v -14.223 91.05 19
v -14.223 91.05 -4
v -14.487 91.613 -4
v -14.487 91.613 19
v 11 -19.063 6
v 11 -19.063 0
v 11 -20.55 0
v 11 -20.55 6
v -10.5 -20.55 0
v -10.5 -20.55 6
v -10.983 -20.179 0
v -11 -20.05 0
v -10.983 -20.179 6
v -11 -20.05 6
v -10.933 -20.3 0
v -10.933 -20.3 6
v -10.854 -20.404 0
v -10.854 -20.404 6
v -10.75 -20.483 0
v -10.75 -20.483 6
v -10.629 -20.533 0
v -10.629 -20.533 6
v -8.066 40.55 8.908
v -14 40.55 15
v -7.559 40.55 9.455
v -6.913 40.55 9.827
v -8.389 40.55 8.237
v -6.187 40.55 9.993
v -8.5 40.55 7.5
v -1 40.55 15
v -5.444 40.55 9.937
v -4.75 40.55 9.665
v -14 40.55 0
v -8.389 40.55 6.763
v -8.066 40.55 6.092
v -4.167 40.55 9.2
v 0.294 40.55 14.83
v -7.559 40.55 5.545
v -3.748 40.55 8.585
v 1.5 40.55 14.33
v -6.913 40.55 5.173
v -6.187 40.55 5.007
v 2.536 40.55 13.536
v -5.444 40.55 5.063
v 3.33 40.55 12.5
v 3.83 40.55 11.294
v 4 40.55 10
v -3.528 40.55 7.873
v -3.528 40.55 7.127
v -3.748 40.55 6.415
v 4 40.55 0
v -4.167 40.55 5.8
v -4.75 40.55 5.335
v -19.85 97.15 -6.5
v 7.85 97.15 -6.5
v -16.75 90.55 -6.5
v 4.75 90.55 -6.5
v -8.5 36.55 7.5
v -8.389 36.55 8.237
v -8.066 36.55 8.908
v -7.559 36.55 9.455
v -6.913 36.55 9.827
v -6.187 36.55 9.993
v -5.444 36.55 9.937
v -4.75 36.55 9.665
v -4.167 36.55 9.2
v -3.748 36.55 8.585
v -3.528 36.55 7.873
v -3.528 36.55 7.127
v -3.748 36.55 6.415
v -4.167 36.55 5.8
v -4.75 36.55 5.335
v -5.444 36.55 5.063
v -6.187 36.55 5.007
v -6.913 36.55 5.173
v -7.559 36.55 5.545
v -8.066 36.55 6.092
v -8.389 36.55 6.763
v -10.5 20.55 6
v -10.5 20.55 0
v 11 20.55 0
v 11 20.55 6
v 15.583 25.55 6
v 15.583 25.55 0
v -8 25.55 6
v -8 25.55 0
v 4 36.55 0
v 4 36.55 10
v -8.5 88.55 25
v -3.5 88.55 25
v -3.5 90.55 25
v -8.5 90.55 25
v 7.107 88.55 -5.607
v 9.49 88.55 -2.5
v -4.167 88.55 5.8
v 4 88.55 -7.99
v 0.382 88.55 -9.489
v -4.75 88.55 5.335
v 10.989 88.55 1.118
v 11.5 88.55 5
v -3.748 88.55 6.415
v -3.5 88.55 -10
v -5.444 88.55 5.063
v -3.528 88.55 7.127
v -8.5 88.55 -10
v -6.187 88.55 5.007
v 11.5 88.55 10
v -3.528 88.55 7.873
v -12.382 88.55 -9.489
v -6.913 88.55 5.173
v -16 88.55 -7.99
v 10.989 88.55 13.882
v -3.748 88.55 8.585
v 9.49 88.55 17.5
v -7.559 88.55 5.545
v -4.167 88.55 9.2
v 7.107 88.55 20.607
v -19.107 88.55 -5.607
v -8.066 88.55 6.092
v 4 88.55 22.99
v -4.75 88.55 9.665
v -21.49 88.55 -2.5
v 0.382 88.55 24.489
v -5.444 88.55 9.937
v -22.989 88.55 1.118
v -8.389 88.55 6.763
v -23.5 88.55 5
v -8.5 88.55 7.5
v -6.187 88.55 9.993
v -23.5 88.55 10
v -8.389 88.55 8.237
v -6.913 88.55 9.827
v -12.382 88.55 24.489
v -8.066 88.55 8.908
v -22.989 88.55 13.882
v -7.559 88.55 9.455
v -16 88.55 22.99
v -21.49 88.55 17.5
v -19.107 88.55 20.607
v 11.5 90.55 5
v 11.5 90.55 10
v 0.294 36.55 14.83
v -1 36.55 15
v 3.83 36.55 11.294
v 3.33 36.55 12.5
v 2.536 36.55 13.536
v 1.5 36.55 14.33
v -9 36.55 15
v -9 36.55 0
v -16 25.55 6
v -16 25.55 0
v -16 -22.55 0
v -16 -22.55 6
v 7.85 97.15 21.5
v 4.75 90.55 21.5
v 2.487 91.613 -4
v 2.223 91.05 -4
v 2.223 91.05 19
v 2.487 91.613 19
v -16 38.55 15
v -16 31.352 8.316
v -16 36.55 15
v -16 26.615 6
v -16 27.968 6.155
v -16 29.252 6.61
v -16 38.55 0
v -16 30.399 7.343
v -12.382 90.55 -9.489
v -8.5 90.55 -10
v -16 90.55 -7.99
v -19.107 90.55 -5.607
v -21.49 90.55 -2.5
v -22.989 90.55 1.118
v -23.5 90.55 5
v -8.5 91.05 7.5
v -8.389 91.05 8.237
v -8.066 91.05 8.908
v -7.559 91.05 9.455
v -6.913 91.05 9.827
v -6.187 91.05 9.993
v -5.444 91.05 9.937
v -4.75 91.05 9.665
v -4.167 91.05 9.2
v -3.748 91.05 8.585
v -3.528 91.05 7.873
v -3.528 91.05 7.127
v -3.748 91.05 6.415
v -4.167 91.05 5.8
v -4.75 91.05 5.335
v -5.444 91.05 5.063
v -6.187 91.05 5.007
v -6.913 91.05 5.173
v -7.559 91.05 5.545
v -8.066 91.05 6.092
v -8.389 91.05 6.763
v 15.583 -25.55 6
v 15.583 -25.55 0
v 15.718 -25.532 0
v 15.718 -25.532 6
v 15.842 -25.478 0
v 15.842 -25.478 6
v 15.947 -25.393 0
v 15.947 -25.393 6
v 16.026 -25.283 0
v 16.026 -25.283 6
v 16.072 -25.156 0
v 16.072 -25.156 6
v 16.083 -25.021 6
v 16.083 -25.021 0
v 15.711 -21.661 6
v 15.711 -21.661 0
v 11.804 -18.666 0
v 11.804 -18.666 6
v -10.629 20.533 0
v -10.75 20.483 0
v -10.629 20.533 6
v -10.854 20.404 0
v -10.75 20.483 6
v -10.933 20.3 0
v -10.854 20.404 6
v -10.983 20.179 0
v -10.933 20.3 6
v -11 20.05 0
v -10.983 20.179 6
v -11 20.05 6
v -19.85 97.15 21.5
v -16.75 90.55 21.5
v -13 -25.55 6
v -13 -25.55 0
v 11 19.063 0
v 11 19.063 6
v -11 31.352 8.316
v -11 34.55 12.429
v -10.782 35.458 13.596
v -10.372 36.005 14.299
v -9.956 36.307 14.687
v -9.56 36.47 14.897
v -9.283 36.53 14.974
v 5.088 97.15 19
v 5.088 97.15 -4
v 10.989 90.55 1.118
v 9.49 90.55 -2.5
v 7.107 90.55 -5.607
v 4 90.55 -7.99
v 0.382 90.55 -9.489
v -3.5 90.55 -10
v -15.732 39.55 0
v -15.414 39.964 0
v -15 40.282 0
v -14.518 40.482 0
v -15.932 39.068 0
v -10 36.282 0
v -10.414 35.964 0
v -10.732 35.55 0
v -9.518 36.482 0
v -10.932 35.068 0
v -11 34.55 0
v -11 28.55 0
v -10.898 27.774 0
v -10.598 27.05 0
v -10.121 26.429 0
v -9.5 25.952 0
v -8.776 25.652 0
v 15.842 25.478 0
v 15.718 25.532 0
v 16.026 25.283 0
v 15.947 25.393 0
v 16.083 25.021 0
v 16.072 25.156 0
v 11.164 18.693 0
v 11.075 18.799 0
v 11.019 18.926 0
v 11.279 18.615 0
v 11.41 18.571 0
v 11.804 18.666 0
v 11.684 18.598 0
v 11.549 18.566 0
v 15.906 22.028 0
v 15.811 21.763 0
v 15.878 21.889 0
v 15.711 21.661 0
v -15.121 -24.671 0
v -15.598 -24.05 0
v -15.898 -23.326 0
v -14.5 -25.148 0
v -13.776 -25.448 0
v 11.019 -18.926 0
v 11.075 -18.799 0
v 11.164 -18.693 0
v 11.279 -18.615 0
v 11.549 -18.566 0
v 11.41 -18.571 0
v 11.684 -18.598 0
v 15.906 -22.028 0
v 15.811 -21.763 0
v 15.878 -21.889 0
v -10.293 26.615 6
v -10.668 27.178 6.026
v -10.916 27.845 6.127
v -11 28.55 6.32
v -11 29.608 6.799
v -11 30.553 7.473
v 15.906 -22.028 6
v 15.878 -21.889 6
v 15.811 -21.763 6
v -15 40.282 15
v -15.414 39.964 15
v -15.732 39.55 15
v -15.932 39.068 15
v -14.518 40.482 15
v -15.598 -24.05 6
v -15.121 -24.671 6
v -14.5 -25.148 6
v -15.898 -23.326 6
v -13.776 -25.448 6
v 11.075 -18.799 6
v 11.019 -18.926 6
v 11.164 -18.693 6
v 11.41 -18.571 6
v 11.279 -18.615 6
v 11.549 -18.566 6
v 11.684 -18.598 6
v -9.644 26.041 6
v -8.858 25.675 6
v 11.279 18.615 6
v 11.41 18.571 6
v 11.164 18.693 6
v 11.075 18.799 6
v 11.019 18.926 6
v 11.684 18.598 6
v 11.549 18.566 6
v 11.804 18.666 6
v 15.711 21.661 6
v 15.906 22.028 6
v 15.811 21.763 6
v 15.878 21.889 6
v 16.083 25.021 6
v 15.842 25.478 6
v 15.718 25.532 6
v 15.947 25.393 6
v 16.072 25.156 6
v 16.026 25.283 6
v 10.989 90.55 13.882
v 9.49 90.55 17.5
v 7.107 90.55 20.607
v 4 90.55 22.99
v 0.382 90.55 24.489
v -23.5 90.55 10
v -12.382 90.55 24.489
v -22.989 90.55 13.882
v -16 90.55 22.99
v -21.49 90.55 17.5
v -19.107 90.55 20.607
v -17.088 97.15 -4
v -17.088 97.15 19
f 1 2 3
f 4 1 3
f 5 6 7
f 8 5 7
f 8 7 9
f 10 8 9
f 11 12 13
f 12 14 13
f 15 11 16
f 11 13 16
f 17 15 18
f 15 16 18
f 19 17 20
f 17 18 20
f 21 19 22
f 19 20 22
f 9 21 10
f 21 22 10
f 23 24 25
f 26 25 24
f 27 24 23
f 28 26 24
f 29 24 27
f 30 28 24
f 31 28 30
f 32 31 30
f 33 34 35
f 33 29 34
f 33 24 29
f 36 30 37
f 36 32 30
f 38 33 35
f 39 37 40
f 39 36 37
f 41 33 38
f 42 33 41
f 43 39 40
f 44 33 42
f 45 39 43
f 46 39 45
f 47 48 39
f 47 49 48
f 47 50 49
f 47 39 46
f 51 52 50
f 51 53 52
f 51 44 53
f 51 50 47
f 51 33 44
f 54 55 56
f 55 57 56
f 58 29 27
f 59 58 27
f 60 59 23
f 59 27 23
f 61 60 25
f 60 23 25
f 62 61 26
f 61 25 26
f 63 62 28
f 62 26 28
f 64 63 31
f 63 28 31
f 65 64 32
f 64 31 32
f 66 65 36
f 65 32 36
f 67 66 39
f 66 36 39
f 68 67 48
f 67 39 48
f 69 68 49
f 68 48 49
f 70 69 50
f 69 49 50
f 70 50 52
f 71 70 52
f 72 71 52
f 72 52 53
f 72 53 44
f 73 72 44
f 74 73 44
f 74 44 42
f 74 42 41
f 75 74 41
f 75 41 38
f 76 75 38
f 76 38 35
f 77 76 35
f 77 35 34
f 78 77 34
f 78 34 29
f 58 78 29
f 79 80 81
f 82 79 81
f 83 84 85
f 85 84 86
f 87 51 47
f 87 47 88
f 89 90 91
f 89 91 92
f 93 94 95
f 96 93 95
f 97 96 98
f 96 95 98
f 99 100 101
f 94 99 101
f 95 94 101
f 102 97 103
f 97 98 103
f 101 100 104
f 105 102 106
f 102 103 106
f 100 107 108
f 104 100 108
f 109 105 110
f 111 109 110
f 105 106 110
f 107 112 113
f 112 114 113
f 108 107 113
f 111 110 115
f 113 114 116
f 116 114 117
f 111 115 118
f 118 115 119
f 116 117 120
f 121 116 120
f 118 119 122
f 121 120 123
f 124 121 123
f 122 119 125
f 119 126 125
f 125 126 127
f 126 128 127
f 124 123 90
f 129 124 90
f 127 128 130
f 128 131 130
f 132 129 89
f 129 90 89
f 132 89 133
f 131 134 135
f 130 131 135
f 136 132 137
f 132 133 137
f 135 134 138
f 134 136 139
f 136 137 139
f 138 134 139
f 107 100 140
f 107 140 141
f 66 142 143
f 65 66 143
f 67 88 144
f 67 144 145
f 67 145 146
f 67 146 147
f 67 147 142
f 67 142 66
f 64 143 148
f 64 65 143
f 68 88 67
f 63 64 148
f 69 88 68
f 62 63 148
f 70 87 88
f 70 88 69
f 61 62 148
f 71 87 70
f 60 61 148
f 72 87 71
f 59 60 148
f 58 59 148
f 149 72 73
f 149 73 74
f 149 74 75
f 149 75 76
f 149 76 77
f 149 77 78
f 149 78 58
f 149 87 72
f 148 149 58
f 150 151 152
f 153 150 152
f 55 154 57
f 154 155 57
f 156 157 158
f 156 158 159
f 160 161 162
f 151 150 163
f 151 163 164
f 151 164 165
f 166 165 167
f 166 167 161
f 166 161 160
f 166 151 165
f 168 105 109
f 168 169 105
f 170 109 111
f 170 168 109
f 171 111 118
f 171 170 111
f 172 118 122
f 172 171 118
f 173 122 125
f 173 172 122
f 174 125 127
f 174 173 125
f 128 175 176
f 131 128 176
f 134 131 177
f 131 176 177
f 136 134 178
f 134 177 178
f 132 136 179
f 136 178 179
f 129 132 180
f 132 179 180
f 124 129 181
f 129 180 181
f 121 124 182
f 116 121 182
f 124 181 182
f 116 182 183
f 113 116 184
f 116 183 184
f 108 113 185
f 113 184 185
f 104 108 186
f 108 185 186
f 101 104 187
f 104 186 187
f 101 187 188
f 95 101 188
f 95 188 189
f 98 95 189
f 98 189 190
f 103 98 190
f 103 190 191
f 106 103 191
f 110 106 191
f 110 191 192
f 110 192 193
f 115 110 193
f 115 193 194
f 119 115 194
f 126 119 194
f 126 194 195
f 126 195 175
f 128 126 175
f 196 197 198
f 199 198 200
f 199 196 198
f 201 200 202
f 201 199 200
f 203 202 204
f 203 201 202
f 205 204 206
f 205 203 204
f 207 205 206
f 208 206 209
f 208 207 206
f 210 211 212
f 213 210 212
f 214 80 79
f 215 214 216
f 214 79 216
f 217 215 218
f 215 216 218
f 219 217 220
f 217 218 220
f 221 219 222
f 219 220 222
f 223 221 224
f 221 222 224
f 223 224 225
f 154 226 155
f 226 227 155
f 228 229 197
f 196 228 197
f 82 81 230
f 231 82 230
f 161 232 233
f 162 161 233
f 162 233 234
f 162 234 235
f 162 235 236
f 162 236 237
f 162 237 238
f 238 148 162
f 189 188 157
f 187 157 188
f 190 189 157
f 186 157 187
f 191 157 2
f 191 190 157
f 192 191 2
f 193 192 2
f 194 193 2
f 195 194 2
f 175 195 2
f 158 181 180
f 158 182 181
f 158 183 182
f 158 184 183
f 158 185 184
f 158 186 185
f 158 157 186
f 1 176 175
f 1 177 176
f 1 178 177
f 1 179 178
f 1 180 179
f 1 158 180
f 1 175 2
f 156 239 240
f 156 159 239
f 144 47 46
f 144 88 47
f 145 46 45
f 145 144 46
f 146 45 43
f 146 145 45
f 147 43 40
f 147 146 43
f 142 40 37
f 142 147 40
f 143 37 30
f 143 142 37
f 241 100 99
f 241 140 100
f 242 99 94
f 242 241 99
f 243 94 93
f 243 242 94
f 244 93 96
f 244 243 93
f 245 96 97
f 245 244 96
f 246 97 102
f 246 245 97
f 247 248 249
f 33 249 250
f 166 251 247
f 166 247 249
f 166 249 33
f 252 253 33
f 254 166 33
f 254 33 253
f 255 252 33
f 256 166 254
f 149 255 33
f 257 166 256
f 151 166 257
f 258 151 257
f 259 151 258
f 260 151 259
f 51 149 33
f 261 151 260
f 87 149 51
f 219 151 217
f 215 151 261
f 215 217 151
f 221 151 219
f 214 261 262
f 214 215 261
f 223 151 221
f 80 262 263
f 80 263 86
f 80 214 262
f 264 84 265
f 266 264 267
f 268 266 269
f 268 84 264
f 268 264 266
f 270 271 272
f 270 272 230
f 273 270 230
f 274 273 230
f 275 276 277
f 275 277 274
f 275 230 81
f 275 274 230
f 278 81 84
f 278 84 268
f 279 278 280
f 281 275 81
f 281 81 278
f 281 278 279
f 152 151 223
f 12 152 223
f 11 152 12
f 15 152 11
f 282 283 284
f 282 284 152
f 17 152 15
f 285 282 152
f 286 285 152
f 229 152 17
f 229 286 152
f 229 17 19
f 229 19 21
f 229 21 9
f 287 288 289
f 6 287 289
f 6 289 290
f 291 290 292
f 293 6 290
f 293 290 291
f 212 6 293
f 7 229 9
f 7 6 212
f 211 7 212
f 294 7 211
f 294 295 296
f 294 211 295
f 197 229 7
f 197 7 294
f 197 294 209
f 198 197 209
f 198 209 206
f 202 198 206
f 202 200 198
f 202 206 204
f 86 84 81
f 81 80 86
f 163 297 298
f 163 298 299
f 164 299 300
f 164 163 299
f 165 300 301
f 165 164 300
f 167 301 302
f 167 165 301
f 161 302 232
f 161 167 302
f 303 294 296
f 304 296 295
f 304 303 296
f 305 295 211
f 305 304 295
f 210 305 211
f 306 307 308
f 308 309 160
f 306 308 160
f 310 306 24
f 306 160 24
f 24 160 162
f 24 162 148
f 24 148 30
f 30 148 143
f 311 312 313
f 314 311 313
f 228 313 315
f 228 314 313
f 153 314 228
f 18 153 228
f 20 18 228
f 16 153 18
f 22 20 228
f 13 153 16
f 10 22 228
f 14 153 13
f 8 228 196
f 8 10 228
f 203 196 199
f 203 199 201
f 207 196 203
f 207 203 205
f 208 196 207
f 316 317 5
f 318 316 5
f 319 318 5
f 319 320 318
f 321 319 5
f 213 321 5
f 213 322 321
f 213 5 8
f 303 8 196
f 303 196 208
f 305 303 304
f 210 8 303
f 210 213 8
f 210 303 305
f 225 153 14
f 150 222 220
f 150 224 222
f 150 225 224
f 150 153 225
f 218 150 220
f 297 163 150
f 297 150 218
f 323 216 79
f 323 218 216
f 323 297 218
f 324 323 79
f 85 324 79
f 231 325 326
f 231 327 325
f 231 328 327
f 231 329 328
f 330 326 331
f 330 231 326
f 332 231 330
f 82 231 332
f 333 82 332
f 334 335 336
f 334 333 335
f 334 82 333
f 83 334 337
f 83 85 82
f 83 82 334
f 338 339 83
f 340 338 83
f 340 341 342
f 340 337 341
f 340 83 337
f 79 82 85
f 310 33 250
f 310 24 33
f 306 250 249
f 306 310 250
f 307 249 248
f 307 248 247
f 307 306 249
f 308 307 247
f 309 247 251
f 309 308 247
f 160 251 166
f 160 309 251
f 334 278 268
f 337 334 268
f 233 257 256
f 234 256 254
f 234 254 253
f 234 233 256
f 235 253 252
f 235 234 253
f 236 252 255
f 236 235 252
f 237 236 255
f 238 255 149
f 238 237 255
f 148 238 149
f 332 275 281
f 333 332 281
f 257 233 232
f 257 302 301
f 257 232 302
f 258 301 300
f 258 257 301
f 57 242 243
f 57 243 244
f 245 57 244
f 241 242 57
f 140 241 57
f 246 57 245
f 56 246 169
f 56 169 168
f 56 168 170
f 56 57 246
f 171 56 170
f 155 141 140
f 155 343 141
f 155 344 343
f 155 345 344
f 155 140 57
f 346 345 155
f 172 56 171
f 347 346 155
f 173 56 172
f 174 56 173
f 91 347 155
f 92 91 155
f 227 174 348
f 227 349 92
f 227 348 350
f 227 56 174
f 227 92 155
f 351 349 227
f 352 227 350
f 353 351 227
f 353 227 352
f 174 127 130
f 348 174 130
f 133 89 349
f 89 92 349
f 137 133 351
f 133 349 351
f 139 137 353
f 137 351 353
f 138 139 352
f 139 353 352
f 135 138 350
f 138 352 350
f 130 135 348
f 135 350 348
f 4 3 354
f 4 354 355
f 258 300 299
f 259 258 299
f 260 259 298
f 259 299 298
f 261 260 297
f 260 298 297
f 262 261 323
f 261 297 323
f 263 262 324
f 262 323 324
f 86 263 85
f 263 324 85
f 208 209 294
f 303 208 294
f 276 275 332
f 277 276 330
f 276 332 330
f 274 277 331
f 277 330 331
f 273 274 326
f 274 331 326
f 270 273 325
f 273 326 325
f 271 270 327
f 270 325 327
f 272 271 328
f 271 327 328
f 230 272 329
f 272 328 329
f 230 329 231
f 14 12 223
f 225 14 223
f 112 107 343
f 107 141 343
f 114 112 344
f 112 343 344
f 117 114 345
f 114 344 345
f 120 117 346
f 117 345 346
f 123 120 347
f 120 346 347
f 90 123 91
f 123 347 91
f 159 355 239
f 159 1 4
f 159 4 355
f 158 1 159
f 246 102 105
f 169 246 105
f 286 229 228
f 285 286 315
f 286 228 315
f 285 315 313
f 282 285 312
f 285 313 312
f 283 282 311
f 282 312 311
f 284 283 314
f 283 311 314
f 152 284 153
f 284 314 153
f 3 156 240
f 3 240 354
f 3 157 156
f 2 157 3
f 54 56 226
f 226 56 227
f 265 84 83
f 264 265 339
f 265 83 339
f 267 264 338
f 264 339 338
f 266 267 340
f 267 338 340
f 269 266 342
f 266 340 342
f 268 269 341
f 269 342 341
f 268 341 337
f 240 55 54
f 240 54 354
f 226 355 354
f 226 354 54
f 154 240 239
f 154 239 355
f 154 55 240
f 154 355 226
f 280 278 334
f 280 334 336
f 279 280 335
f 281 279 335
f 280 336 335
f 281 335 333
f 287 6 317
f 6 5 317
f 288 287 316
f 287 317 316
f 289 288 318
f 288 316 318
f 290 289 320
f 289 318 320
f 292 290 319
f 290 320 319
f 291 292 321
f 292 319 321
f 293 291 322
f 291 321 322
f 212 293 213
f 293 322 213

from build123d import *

# Parameters (mm, degrees)
F1_DEPTH     = 6
F3_DEPTH     = 15
F5_DEPTH     = 5.0000008951
F6_R         = 5
F10_DEPTH    = 5
F11_W        = 35
F11_H        = 35
F12_DEPTH    = 2
F15_W        = 27.7
F15_H        = 28
F13_W        = 21.5
F13_H        = 28
F17_T        = 2.5
F17_T3_DEPTH = 26.5
F17_T5_DEPTH = 33
F19_R        = 2.5
F20_DEPTH    = 54.5
F21_R        = 15
F22_R        = 3
F23_R        = 0.5
F24_R        = 2
F25_R        = 6


# Not quite as in the source:
# - ends of sketch curves that miss each other by under 0.0002 mm in the source are joined
# - a shell that OpenCascade refuses in one call is made with other operations: the cavity is built on its own and cut out


with BuildPart() as f1:
    # F0 (on Top) → F1 (new body)
    with BuildSketch(Plane.XY):
        Polygon((11.0000005256, -18.05), (11.0000005256, -20.55), (-11.0000005256, -20.55), (-10.9999994744, 20.55), (11.0000005256, 20.55), (11.0000005256, 18.05), (15.8927322497, 21.8000001848), (16.1137396651, 25.5500003695), (11.4420153564, 25.5500003695), (-15.9999997161, 25.5500003695), (-16.000001023, -25.5500003695), (11.4420153564, -25.5500003695), (16.1137396651, -25.5500003695), (15.8927322497, -21.8000001848), align=None)
    extrude(amount=F1_DEPTH)

    # F2 (on face) → F3 (join)
    with BuildSketch(Plane(origin=(0, 0, 0), x_dir=(1, 0, 0), z_dir=(0, 0, -1))):
        Polygon((-10.9999994744, -25.5500003695), (-15.9999997161, -25.5500003695), (-15.9999997161, -40.5500003695), (-10.9999994744, -40.5500003695), (4.0000002839, -40.5500003695), (4.0000002839, -36.5500003695), (-10.9999994744, -36.5500003695), align=None)
    extrude(amount=-F3_DEPTH)

    # F4 (on face) → F5 (cut, through all)
    with BuildSketch(Plane.YZ.offset(-10.9999994744)):
        Polygon((25.5500003695, 15), (25.5500003695, 6), (29.5500003695, 6), (36.5500003695, 15), align=None)
    extrude(amount=-F5_DEPTH, mode=Mode.SUBTRACT)

    # F6
    f6_edges = [f1.edges().sort_by_distance(p)[0] for p in [
        (4, 38.55, 15),
    ]]
    fillet(f6_edges, radius=F6_R)


with BuildPart() as f10:
    # F9 (on offset) → F10 (new body)
    with BuildSketch(Plane(origin=(0, 65.5500003695, 0), x_dir=(-1, 0, 0), z_dir=(0, 1, 0))):
        with BuildLine():
            Line((15.9999997161, 0), (15.9999997161, 15))
            Line((15.9999997161, 15), (0.9999997161, 15))
            ThreePointArc((0.9999997161, 15), (-2.5355341898, 13.5355339059), (-4.0000002839, 10))
            Line((-4.0000002839, 10), (-4.0000002839, 0))
            Line((-4.0000002839, 0), (15.9999997161, 0))
        make_face()
    extrude(amount=F10_DEPTH)


with BuildPart() as f12:
    # F11 (on offset) → F12 (new body)
    with BuildSketch(Plane(origin=(0, 88.5500003695, 0), x_dir=(-1, 0, 0), z_dir=(0, 1, 0))):
        with Locations((5.9999997161, 7.5)):
            Rectangle(F11_W, F11_H)
    extrude(amount=F12_DEPTH)

    # F15 (on offset) → F16 section 0
    with BuildSketch(Plane(origin=(0, 97.1500003695, 0), x_dir=(-1, 0, 0), z_dir=(0, 1, 0))):
        with Locations((5.9999997161, 7.5)):
            Rectangle(F15_W, F15_H)
    # F13 (on face) → F16 section 1
    with BuildSketch(Plane(origin=(0, 90.5500003695, 0), x_dir=(-1, 0, 0), z_dir=(0, 1, 0))):
        with Locations((5.9999997161, 7.5)):
            Rectangle(F13_W, F13_H)
    loft()

    # F17: shell of thickness 2.5, made by hand


with BuildPart() as f17_core1:
    # F17_t2: copy of F12
    add(f12.part)

    # the walls: a layer under each face that stays
    f17_faces = [f17_core1.faces().sort_by_distance(p)[0] for p in [
        (-5.9999997161, 89.5500003695, -10),
        (11.5000002839, 89.5500003695, 7.5),
        (-23.4999997161, 89.5500003695, 7.5),
        (-5.9999997161, 88.5500003695, 7.5),
        (5.6666669506, 90.5500003695, -4.1666666667),
        (-5.9999997161, 89.5500003695, 25),
        (-5.9999997161, 93.8500003695, -6.5),
        (-18.2999997161, 93.8500003695, 7.5),
        (-5.9999997161, 93.8500003695, 21.5),
        (6.3000002839, 93.8500003695, 7.5),
    ]]
    thicken(f17_faces, amount=-F17_T, mode=Mode.SUBTRACT)

    # F17_s4 → F17_t3 (cut)
    with BuildSketch(Plane.YZ.offset(-19.2499997161)):
        Polygon((90.5750003695, -6.525), (88.0500003695, -6.5), (88.0500003695, -4), (90.5500003695, -4), align=None)
        Polygon((90.5750003695, 21.525), (88.0500003695, 21.5), (88.0500003695, 19), (90.5500003695, 19), align=None)
    extrude(amount=F17_T3_DEPTH, mode=Mode.SUBTRACT)

    # F17_s6 → F17_t5 (cut)
    with BuildSketch(Plane.XY.offset(-9)):
        Polygon((-16.7726279476, 90.5643719578), (-16.7499997161, 88.0500003695), (-12.8137208564, 88.0500003695), (-14.4871765615, 91.6128415482), align=None)
        Polygon((4.7726285154, 90.5643719578), (4.7500002839, 88.0500003695), (0.8137214242, 88.0500003695), (2.4871771293, 91.6128415482), align=None)
    extrude(amount=F17_T5_DEPTH, mode=Mode.SUBTRACT)


with BuildPart() as f12_1:
    add(f12.part)

    # what is left inside the walls is the cavity
    f17_cavity = [f17_core1.part.solids().sort_by_distance(p)[0] for p in [
        (-2.215544, 97.125, 11.243908),
    ]]
    add(f17_cavity, mode=Mode.SUBTRACT)


with BuildPart() as f20_tool:
    # F19 (on face) → F20 (new body, through all)
    with BuildSketch(Plane(origin=(0, 91.0500003695, 0), x_dir=(-1, 0, 0), z_dir=(0, 1, 0))):
        with Locations((5.9999997161, 7.5)):
            Circle(F19_R)
    extrude(amount=-F20_DEPTH)


with BuildPart() as f1_1:
    add(f1.part)

    # F20: cut by f20_tool
    add(f20_tool.part, mode=Mode.SUBTRACT)

    # F22
    f22_edges = [f1_1.edges().sort_by_distance(p)[0] for p in [
        (-16.000001, -25.55, 3),
        (-10.999999, 25.55, 3),
    ]]
    fillet(f22_edges, radius=F22_R)

    # F23
    f23_edges = [f1_1.edges().sort_by_distance(p)[0] for p in [
        (11.000001, -18.05, 3),
        (11.000001, 18.05, 3),
        (-10.999999, 20.55, 3),
        (-11.000001, -20.55, 3),
        (16.11374, 25.55, 3),
        (15.892732, 21.8, 3),
        (15.892732, -21.8, 3),
        (16.11374, -25.55, 3),
    ]]
    fillet(f23_edges, radius=F23_R)

    # F24
    f24_edges = [f1_1.edges().sort_by_distance(p)[0] for p in [
        (-16, 40.55, 7.5),
        (-10.999999, 36.55, 7.5),
    ]]
    fillet(f24_edges, radius=F24_R)

    # F25
    f25_edges = [f1_1.edges().sort_by_distance(p)[0] for p in [
        (-13.5, 29.55, 6),
    ]]
    fillet(f25_edges, radius=F25_R)


with BuildPart() as f12_2:
    add(f12_1.part)

    # F20: cut by f20_tool
    add(f20_tool.part, mode=Mode.SUBTRACT)

    # F21
    f21_edges = [f12_2.edges().sort_by_distance(p)[0] for p in [
        (11.5, 89.55, 25),
        (-23.5, 89.55, 25),
        (-23.5, 89.55, -10),
        (11.5, 89.55, -10),
    ]]
    fillet(f21_edges, radius=F21_R)


solid = Compound([f1_1.part, f12_2.part])
